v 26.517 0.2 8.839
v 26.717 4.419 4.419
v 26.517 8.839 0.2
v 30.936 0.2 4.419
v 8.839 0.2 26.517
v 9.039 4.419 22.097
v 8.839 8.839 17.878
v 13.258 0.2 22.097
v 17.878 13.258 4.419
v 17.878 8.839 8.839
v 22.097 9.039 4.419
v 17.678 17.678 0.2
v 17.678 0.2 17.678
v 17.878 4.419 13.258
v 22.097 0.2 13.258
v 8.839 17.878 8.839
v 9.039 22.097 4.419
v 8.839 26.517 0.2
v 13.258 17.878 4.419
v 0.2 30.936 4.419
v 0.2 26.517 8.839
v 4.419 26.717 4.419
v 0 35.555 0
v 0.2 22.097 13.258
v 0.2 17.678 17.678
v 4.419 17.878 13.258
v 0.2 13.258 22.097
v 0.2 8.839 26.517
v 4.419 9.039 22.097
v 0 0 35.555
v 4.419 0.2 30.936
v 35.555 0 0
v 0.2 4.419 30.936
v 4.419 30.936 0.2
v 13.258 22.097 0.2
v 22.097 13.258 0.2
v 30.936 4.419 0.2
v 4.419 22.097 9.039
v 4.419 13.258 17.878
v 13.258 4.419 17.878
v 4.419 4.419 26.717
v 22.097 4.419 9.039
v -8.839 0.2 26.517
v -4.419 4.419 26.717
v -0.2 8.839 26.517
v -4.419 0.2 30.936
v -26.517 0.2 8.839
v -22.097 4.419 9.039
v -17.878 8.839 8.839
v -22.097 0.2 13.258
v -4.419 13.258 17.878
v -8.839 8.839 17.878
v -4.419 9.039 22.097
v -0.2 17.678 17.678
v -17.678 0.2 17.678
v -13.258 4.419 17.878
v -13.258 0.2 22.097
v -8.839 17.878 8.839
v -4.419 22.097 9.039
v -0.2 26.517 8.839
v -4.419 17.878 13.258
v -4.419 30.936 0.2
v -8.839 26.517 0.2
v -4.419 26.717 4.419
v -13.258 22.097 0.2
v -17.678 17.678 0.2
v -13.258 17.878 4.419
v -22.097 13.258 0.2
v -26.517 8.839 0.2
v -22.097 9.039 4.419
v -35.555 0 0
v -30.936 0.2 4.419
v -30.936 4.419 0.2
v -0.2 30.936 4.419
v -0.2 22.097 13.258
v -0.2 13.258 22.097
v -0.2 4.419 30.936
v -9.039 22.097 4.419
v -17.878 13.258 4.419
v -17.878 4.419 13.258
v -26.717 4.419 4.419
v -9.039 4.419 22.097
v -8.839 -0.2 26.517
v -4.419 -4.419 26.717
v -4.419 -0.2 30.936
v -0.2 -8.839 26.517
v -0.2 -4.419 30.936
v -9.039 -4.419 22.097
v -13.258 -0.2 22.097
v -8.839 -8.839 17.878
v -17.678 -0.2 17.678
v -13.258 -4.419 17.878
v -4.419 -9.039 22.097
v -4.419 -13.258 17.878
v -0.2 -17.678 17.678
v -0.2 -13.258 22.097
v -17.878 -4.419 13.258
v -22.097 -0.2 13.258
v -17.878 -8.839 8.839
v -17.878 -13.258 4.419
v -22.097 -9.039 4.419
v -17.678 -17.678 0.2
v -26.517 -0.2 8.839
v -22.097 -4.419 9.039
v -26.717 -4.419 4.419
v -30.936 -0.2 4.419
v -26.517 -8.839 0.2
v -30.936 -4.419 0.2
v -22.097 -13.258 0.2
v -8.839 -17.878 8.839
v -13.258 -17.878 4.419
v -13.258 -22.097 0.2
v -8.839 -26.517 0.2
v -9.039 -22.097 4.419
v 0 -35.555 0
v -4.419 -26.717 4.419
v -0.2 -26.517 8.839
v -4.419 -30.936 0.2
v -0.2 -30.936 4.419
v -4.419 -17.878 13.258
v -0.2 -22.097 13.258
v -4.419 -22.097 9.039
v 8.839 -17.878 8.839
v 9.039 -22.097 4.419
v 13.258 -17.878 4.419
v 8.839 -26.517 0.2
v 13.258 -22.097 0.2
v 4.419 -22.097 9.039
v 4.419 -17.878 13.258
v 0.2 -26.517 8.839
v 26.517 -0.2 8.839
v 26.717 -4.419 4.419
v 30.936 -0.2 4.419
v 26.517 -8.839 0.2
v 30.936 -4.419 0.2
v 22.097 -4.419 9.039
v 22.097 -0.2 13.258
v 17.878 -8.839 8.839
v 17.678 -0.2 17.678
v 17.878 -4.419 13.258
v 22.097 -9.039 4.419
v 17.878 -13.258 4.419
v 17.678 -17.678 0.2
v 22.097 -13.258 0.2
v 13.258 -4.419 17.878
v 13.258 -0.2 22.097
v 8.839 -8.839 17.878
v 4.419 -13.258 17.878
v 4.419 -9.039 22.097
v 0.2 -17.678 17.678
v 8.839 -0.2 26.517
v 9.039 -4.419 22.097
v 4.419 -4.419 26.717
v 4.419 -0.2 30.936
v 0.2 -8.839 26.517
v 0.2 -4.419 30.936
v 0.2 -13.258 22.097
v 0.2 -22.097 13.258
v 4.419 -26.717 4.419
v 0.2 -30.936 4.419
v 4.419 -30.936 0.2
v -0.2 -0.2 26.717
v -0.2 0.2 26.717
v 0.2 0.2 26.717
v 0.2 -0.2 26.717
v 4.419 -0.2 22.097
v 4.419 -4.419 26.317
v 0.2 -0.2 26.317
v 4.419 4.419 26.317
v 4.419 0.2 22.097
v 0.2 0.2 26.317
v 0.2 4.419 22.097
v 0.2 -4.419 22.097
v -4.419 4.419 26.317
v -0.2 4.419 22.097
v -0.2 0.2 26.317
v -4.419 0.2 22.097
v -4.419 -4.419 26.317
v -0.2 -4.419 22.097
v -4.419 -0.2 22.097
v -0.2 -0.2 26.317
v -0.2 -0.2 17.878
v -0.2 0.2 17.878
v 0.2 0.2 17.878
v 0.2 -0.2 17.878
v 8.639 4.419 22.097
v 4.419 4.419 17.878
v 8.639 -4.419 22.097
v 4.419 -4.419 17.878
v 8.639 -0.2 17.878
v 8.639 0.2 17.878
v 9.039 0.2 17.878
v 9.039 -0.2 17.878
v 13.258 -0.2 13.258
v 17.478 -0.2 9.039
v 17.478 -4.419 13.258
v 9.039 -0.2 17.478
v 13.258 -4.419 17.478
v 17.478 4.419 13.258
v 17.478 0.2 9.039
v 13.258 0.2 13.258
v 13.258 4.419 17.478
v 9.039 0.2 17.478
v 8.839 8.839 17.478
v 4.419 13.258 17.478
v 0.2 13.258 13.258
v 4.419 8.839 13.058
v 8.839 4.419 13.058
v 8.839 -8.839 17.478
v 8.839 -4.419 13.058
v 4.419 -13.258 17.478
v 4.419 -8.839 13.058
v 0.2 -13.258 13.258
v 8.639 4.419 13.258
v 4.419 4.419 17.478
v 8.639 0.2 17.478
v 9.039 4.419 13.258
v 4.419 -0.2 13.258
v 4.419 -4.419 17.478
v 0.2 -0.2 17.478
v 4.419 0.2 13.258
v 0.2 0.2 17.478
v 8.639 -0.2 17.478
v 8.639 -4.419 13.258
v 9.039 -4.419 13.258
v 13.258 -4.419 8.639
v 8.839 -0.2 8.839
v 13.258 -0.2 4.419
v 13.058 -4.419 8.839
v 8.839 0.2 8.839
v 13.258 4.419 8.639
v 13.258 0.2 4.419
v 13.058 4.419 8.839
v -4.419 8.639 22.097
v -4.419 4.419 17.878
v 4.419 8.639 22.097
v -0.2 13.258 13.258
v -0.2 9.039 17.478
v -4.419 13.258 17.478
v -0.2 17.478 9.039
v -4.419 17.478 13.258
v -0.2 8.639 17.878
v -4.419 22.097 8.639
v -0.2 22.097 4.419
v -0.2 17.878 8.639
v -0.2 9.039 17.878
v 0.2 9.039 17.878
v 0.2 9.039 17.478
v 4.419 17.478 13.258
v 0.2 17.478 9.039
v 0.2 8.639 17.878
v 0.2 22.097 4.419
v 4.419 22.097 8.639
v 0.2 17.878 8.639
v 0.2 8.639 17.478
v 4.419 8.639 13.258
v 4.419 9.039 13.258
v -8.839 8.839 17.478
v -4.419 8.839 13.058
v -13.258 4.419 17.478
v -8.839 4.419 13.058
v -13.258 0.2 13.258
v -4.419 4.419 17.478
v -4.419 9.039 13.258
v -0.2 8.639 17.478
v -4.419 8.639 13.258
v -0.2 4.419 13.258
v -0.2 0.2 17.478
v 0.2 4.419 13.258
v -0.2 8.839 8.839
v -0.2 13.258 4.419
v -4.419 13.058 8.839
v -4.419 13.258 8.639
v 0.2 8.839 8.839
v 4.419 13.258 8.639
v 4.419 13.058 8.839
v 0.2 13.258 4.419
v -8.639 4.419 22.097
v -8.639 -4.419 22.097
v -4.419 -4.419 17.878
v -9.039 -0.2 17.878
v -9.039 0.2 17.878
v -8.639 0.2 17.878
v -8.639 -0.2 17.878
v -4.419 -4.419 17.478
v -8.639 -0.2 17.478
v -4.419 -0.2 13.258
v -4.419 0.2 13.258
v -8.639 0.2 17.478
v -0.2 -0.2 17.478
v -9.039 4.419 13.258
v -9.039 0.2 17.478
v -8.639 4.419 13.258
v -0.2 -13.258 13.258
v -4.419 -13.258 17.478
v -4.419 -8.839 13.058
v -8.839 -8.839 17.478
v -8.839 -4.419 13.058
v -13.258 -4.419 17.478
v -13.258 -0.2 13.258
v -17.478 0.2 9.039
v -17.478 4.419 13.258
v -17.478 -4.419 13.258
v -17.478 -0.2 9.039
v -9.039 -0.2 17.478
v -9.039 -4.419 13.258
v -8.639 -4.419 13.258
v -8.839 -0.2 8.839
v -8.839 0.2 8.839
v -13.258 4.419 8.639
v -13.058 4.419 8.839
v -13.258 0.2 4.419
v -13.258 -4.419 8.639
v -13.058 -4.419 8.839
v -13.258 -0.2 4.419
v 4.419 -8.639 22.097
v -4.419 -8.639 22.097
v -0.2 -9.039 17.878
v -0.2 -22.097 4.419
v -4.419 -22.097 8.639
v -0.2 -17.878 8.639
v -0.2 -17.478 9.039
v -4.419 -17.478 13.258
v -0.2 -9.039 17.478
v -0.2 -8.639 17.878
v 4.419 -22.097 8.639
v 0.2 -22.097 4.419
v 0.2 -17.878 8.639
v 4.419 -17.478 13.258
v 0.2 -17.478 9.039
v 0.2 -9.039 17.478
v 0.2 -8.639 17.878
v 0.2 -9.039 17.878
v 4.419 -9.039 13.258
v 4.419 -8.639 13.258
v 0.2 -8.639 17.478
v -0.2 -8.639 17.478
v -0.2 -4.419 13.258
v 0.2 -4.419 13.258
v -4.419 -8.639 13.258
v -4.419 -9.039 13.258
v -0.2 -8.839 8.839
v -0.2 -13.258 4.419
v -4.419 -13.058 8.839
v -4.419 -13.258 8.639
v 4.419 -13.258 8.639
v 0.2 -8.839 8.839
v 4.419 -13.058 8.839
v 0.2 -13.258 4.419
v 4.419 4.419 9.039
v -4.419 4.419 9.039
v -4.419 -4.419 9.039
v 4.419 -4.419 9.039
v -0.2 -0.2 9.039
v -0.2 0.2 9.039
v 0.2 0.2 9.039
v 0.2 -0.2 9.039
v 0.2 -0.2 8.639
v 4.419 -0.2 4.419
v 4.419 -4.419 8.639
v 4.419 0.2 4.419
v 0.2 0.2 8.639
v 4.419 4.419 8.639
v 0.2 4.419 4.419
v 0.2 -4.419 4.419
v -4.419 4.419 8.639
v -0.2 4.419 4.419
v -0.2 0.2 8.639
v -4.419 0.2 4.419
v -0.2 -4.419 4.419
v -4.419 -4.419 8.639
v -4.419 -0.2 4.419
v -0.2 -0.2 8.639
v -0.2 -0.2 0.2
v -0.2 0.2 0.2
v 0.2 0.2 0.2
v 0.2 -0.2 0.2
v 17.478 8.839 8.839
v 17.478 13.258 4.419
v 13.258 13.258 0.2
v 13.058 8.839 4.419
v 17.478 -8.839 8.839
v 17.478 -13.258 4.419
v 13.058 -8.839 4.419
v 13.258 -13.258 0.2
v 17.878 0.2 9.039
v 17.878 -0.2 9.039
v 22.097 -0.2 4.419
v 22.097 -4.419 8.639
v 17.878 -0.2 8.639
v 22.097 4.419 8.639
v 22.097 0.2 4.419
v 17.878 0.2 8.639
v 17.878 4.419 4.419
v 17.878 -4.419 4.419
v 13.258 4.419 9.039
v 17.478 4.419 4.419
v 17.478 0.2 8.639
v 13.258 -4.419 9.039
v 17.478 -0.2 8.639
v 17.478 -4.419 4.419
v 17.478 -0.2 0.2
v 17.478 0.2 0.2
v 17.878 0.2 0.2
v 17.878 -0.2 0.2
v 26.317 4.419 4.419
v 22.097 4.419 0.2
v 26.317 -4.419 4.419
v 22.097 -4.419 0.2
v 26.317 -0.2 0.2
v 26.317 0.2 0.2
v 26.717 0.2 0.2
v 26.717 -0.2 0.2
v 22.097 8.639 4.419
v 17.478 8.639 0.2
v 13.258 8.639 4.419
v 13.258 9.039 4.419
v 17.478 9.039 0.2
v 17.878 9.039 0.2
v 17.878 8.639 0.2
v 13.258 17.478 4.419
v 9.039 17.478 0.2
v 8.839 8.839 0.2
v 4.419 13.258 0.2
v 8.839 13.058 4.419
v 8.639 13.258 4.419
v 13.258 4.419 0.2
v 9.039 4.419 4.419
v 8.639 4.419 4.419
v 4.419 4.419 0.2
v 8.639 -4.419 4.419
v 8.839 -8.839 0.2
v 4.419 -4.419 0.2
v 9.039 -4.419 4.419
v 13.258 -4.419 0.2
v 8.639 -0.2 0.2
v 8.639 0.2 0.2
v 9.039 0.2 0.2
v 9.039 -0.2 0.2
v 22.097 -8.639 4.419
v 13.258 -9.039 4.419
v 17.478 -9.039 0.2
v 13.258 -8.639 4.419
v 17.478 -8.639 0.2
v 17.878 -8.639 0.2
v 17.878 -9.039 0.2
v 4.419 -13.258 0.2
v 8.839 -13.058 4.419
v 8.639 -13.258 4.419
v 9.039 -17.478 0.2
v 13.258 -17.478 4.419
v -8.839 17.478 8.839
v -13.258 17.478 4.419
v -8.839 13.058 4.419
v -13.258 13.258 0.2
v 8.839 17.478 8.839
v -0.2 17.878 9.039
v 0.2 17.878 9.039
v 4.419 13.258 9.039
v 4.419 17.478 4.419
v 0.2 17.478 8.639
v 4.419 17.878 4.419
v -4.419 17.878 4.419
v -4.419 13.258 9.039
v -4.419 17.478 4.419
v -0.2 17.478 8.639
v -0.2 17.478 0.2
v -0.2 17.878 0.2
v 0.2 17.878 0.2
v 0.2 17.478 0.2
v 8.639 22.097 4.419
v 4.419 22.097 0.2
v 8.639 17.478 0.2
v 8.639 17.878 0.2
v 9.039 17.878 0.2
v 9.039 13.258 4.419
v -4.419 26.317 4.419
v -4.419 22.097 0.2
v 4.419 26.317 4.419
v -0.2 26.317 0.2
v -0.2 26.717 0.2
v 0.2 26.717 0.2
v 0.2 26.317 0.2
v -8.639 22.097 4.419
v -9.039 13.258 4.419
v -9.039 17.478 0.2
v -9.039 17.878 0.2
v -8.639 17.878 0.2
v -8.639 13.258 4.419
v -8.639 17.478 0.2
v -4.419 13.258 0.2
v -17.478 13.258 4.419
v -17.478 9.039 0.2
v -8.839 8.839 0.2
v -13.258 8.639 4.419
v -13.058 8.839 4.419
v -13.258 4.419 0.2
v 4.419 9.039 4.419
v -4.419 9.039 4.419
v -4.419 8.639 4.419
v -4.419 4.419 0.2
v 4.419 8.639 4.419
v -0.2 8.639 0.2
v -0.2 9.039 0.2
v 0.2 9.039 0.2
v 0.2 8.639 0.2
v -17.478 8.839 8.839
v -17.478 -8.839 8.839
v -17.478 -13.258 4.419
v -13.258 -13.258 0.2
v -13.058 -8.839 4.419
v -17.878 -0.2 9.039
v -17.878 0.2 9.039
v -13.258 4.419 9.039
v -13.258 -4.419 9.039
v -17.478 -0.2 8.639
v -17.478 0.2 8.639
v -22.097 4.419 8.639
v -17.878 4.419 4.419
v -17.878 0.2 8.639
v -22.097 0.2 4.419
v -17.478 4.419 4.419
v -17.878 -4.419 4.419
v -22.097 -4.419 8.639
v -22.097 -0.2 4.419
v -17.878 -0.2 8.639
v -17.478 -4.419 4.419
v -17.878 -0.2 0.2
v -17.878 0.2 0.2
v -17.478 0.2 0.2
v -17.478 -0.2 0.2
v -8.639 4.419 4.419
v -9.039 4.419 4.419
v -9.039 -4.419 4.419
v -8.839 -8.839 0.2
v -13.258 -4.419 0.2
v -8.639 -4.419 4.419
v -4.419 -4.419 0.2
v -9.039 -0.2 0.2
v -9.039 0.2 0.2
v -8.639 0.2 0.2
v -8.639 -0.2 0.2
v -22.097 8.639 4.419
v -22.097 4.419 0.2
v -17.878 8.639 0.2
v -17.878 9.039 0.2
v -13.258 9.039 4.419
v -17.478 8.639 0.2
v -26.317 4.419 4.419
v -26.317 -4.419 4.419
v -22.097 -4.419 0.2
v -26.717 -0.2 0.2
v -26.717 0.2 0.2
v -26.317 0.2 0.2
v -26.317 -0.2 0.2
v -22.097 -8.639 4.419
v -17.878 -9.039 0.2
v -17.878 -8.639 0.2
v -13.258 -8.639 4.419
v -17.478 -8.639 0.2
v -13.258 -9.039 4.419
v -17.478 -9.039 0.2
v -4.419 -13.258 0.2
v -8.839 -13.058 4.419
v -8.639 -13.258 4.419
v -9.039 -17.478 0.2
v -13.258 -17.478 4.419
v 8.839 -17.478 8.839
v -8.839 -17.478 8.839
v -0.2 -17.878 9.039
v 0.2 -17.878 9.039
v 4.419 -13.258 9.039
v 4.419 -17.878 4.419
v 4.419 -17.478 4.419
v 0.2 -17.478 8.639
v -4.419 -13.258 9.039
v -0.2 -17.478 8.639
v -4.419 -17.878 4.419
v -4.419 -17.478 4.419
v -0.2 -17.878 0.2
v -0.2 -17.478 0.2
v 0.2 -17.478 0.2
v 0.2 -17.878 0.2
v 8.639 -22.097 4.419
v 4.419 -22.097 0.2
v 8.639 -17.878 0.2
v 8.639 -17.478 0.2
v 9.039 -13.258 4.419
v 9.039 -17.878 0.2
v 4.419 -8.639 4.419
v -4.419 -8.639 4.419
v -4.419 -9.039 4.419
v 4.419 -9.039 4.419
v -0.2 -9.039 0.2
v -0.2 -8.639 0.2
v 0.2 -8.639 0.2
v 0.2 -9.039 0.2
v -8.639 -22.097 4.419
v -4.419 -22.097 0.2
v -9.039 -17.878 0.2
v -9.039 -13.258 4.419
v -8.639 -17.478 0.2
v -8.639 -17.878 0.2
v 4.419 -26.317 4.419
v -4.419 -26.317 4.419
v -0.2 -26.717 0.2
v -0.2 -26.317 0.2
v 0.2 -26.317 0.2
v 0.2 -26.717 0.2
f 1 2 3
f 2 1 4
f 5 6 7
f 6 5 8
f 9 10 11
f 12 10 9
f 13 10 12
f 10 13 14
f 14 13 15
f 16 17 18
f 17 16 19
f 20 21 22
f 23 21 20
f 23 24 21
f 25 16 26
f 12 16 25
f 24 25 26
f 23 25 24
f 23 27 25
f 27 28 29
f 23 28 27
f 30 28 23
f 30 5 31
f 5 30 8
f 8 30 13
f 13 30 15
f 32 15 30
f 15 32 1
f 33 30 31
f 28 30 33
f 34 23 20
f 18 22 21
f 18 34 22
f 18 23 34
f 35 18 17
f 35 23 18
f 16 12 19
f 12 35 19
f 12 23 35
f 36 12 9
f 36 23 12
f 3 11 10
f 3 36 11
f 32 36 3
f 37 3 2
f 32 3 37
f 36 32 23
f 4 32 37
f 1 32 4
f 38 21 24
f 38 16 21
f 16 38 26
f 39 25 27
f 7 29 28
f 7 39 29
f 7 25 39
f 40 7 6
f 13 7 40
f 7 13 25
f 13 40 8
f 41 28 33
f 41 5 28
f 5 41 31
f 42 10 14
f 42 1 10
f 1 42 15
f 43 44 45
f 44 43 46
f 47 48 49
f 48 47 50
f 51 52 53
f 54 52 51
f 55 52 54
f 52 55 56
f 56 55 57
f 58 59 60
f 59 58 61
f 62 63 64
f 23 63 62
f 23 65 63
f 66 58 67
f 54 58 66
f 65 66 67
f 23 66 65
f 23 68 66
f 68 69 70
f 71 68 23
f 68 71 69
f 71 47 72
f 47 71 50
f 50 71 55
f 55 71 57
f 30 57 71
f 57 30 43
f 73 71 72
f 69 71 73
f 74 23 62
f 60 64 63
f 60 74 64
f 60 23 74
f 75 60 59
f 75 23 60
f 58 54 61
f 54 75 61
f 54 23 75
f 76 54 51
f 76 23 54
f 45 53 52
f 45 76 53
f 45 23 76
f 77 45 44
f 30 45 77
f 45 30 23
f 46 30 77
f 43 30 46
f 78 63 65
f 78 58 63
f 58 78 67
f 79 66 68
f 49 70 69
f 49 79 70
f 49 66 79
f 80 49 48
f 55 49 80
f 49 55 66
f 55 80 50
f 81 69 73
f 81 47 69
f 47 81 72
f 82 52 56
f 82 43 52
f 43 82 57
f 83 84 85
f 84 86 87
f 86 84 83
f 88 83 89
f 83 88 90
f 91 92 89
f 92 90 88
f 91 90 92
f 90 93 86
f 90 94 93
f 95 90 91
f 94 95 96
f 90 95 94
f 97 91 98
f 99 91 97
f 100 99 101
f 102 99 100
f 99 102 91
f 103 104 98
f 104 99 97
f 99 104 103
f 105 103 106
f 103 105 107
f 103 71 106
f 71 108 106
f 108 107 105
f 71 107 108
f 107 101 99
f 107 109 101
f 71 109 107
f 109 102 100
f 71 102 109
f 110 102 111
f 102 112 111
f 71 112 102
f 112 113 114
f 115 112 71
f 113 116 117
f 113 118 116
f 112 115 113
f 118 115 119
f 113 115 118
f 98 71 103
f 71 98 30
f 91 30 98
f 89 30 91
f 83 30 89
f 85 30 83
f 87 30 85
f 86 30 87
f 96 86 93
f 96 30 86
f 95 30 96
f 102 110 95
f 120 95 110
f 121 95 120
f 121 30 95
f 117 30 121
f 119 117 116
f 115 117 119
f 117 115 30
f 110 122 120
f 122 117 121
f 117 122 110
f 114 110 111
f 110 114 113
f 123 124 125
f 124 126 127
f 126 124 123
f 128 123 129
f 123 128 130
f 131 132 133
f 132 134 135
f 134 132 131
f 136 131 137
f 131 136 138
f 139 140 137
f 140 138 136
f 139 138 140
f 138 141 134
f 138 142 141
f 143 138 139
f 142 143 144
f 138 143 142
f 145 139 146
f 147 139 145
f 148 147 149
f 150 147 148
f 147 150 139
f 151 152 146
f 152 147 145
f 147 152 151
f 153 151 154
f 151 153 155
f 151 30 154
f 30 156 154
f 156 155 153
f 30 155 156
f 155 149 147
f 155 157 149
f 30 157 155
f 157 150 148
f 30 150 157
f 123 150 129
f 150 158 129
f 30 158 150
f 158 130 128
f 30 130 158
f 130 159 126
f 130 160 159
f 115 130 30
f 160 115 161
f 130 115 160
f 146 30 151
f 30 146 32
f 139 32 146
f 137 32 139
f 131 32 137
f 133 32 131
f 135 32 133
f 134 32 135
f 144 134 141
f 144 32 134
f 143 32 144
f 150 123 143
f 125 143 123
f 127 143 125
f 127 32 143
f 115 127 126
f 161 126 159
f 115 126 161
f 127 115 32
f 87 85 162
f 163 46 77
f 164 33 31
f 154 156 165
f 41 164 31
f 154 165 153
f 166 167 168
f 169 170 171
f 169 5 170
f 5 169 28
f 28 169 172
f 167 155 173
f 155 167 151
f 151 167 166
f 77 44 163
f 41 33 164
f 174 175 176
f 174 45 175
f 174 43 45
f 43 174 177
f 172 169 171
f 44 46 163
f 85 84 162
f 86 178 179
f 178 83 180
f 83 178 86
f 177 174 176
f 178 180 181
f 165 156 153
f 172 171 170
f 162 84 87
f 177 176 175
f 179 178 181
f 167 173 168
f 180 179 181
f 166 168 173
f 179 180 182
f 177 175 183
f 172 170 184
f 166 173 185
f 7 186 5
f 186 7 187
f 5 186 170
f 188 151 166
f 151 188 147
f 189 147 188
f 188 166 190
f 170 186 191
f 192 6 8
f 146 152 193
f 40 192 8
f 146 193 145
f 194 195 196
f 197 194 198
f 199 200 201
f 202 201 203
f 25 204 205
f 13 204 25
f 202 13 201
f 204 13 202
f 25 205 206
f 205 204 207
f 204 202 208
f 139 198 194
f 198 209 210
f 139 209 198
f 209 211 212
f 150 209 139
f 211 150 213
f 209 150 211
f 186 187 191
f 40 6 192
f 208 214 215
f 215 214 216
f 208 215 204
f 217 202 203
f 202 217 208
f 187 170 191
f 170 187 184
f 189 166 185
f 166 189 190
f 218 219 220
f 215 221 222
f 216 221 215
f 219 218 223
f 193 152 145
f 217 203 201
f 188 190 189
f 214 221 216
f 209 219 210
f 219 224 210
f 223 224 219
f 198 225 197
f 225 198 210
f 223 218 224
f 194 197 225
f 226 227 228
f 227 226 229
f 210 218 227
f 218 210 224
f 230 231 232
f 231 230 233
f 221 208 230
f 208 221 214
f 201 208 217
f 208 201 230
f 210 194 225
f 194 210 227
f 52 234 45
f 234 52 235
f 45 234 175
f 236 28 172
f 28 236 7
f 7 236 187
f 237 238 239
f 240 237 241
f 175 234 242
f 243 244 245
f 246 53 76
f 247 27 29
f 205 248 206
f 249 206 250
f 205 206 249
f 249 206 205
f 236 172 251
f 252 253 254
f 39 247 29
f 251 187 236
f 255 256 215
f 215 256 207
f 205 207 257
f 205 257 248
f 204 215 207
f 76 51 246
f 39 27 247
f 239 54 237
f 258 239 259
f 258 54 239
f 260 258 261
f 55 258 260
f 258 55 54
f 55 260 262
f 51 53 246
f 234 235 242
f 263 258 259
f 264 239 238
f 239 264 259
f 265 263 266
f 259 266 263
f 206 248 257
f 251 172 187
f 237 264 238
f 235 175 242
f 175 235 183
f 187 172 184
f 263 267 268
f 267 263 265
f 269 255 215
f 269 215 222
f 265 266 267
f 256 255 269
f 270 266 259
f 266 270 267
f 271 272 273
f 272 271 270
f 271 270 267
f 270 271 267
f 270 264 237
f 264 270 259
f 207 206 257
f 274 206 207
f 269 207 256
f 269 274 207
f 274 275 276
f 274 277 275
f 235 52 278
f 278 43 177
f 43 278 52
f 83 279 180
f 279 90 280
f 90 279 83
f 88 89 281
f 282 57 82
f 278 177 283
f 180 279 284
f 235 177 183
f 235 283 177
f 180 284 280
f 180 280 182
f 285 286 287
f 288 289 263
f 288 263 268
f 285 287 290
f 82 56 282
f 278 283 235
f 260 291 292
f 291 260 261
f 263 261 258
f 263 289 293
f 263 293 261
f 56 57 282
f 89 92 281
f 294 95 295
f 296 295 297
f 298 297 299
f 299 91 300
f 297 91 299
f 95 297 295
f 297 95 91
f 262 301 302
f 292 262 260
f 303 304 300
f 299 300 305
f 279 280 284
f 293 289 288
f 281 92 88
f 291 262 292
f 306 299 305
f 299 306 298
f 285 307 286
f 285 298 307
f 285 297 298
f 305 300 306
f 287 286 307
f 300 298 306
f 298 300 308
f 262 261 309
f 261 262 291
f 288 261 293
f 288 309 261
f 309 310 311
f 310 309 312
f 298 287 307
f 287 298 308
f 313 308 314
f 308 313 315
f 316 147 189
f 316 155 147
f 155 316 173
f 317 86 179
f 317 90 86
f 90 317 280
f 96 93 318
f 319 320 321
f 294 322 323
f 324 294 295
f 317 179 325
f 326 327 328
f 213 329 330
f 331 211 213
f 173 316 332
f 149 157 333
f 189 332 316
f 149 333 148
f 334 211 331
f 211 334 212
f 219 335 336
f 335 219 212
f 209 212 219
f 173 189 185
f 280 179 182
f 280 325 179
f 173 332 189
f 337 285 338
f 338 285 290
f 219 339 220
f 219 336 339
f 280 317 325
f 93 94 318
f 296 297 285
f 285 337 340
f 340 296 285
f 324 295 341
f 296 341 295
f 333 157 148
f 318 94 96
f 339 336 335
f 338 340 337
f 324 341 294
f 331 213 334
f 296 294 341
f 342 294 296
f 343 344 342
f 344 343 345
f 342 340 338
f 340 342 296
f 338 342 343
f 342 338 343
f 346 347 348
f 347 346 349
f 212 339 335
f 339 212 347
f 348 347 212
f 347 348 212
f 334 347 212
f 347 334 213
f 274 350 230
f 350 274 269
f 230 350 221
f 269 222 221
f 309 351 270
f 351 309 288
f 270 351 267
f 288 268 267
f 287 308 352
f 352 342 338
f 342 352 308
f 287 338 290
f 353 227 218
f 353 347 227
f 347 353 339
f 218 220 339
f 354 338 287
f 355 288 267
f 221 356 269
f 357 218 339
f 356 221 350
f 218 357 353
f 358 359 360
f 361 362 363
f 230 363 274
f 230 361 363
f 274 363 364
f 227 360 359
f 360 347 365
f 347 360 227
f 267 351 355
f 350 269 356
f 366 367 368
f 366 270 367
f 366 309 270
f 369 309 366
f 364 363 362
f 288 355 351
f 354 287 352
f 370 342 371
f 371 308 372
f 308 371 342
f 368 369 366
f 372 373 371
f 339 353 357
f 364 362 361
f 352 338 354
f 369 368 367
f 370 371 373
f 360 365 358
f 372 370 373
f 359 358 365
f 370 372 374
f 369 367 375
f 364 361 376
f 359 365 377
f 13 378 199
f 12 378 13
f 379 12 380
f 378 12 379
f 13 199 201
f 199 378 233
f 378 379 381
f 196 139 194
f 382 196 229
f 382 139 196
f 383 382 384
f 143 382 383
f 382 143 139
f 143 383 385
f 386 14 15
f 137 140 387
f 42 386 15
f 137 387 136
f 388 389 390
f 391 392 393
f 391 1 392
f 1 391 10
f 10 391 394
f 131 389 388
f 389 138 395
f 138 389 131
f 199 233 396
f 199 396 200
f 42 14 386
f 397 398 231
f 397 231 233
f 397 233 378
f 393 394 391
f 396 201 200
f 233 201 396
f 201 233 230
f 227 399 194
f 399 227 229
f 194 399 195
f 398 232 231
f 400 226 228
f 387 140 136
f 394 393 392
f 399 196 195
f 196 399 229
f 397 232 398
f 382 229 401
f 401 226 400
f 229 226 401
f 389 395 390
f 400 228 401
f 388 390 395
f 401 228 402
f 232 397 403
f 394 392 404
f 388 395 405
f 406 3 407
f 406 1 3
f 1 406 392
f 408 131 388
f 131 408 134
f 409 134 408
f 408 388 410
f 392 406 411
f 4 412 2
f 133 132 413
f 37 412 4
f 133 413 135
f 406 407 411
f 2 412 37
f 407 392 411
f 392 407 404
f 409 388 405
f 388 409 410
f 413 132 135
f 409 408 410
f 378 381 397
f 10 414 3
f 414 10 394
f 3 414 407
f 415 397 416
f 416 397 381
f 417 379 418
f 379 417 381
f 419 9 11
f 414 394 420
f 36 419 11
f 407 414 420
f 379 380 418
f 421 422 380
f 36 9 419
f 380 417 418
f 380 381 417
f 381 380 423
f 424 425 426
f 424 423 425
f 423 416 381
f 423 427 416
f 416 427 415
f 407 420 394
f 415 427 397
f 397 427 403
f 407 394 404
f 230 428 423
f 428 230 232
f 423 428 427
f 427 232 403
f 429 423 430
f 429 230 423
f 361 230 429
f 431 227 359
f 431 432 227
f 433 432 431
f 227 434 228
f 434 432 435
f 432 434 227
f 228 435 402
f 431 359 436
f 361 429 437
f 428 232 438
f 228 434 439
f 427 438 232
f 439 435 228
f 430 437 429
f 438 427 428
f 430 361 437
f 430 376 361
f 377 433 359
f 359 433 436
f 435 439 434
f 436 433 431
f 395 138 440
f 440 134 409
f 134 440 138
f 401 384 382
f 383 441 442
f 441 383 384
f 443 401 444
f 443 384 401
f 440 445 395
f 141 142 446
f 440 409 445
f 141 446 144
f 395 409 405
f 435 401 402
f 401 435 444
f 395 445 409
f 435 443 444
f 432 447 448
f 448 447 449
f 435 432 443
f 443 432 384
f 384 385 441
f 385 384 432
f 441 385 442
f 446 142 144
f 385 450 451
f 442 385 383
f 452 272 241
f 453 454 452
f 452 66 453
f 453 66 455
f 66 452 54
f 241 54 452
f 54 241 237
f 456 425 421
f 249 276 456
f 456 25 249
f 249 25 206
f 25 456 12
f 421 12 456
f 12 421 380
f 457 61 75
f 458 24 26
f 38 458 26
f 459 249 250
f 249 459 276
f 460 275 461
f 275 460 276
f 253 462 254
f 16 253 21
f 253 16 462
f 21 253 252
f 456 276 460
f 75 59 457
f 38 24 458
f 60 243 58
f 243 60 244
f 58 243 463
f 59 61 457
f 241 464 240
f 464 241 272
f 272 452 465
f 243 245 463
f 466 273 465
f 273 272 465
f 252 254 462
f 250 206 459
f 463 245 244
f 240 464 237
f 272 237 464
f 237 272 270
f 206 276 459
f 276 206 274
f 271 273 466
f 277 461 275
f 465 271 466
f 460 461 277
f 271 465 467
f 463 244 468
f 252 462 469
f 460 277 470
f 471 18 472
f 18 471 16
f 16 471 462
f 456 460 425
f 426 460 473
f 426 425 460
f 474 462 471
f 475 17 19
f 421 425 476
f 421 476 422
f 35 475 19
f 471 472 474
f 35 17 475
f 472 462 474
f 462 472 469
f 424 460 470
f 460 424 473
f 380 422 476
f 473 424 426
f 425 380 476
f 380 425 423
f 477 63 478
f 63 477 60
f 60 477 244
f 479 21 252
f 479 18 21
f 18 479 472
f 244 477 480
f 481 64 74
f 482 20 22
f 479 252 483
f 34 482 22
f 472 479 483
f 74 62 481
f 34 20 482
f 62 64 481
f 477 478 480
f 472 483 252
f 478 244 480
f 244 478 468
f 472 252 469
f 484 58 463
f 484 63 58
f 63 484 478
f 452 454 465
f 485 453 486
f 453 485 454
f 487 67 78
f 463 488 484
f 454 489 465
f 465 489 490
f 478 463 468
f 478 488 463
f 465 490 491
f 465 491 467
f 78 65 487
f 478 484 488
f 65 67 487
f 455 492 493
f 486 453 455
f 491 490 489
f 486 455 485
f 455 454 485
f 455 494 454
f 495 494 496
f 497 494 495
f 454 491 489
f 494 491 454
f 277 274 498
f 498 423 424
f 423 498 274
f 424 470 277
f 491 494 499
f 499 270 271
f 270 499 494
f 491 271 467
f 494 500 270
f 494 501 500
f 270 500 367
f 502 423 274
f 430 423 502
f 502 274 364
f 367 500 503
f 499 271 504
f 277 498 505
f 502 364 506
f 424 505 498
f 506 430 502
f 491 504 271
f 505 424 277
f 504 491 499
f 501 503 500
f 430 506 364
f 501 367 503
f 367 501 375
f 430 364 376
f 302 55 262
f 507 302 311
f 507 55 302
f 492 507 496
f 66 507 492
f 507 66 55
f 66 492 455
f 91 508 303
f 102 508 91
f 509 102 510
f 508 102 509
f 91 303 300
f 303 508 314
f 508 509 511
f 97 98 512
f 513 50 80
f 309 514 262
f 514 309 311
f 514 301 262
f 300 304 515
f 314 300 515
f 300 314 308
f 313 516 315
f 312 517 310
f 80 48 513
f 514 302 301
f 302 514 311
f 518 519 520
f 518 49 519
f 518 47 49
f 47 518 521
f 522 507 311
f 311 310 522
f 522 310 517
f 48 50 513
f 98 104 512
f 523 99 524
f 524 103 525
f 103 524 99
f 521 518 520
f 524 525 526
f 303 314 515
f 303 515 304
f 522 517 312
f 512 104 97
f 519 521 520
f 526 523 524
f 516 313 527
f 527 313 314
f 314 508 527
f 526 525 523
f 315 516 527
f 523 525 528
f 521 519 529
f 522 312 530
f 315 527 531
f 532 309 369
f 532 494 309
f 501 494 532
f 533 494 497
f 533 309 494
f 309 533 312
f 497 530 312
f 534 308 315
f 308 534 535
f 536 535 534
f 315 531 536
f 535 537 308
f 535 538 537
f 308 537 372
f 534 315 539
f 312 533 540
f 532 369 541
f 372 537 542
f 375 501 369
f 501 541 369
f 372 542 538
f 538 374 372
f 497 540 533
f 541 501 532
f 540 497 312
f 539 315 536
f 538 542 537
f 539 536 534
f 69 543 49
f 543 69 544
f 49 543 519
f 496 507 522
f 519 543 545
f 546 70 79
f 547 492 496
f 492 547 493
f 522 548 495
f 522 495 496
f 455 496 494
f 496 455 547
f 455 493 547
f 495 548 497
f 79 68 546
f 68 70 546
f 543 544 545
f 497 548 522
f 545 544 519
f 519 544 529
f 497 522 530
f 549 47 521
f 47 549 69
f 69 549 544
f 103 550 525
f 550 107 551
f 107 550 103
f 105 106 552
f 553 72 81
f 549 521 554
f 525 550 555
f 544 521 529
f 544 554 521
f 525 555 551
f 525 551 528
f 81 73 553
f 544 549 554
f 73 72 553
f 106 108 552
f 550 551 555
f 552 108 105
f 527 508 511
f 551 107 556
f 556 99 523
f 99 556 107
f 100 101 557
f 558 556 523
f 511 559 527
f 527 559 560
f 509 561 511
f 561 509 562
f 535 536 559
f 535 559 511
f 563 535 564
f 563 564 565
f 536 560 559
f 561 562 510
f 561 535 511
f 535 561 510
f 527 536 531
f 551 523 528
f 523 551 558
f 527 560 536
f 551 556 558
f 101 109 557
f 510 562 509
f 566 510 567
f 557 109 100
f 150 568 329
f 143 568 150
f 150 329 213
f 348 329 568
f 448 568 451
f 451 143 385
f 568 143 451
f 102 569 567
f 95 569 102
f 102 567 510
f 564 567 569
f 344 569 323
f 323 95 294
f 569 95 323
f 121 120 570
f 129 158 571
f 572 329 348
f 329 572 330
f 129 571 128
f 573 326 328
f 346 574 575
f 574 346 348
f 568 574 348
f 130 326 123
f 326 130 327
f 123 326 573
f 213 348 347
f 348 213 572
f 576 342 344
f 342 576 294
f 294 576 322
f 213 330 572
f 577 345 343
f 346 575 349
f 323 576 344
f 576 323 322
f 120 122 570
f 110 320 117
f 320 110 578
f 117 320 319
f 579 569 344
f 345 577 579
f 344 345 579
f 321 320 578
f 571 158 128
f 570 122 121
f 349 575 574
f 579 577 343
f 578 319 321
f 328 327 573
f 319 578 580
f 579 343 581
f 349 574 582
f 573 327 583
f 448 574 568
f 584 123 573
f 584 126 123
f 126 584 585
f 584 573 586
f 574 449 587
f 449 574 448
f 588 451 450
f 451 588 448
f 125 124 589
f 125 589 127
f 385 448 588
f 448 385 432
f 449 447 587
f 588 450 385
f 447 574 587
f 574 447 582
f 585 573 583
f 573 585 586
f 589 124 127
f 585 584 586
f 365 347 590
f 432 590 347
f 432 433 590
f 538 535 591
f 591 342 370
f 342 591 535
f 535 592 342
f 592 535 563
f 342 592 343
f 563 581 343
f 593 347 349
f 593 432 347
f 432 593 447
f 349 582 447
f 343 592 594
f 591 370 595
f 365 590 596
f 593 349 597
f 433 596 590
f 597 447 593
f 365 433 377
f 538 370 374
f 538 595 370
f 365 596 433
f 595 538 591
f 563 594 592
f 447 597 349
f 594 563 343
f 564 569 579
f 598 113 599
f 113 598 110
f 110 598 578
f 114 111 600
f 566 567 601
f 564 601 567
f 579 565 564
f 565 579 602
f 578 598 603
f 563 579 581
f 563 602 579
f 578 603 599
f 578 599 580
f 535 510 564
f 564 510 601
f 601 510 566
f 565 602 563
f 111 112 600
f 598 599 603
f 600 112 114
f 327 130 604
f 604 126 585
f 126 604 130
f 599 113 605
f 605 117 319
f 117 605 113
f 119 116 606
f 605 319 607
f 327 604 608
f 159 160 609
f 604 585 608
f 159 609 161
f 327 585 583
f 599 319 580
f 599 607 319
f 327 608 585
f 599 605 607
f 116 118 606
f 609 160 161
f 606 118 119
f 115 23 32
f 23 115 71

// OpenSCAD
// shape of the model
shape = "pyramid";//[octahedron,pyramid]
//base size
size = 50;
//number of cutouts ( smaller number = more cutouts)
x = 0;
// thicken up the octahedron a little bit
thicken = .20;

// octahedron size
fdepth = 3;


size0 = size / sqrt(2);

module octa(depth, vec, sz) {
    cx = vec[0];
    cy = vec[1];
    cz = vec[2];
    if (depth == fdepth) {
        szc = sz + thicken;
        polyhedron(points = [
            [cx      , cy      , cz + szc],
            [cx + szc, cy      , cz      ],
            [cx      , cy + szc, cz      ],
            [cx - szc, cy      , cz      ],
            [cx      , cy - szc, cz      ],
            [cx      , cy      , cz - szc]],
           faces = [[0, 1, 2], [0, 2, 3], [0, 3, 4], [0, 4, 1],
                    [5, 4, 3], [5, 3, 2], [5, 2, 1], [5, 1, 4]],
            convexity = 2);
    } else {
       octa(depth + 1, [cx         , cy         , cz + sz / 2], sz / 2);
       octa(depth + 1, [cx + sz / 2, cy         , cz         ], sz / 2);
       octa(depth + 1, [cx         , cy + sz / 2, cz         ], sz / 2);
       octa(depth + 1, [cx - sz / 2, cy         , cz         ], sz / 2);
       octa(depth + 1, [cx         , cy - sz / 2, cz         ], sz / 2);
       octa(depth + 1, [cx         , cy         , cz - sz / 2], sz / 2);
    }
}
module cutout_cube(){
    translate([0, 0, -5000]){
    cube([10000, 10000, 10000], center=true);
}
}
if (shape == "pyramid"){
    echo("pyramid");
    difference(){
    octa(x, [0, 0, 0], size0);
        
    cutout_cube();
    }
}
else{
    octa(x, [0, 0, 0], size0);
}
// https://www.thingiverse.com/thing:1123004    
